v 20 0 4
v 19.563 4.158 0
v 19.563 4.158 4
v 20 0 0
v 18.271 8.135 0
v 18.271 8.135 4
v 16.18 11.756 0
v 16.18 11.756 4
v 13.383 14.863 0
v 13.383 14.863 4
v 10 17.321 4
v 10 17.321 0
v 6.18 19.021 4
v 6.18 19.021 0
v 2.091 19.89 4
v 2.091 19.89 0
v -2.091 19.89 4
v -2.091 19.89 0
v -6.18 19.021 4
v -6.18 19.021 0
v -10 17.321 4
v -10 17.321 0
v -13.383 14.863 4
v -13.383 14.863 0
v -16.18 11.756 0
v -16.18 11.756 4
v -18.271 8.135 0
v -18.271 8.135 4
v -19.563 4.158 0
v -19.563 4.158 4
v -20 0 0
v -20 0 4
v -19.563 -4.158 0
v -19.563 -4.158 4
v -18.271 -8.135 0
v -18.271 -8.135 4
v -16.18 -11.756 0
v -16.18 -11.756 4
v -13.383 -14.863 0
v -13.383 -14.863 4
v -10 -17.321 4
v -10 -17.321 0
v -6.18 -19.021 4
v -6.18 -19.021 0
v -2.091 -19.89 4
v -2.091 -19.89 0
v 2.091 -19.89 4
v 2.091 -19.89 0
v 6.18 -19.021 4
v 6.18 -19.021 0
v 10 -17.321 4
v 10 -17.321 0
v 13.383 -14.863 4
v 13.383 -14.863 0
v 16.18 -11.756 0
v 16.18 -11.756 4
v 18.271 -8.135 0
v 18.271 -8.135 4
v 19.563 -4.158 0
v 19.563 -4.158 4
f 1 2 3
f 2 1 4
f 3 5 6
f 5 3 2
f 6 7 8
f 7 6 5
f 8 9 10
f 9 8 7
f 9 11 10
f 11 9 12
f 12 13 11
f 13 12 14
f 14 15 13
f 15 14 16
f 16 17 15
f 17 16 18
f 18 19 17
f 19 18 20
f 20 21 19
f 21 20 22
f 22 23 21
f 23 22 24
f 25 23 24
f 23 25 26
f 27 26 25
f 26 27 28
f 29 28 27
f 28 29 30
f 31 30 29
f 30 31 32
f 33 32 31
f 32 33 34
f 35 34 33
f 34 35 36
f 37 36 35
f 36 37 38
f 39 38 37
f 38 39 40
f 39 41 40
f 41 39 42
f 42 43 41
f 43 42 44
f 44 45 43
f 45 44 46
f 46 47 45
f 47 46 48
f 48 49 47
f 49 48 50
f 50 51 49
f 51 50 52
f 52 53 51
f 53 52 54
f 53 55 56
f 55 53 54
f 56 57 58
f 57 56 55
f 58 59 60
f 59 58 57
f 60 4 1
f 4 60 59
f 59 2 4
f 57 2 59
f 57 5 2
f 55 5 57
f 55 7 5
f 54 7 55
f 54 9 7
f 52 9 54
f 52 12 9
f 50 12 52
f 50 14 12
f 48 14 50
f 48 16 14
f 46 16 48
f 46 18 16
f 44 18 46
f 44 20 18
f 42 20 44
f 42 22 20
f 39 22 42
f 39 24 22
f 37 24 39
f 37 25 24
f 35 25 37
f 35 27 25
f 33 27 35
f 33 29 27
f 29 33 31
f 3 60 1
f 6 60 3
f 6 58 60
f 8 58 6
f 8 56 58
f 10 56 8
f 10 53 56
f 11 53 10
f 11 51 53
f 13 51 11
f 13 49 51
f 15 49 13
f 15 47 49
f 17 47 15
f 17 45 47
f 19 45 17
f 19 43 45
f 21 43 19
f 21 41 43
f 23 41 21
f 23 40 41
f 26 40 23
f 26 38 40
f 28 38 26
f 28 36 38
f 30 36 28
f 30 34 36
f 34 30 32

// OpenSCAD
// Hollow Multicolored Christmas Tree Test

Tree = false;
TreeBase = true;
Ball1 = false;
Ball2 = false;


if(Tree == true){
	Tree();	
}

if(TreeBase == true){
	TreeBase();
}

if(Ball1 == true){
	Ball1();
}
if(Ball2 == true){
	Ball2();
}

module Tree(){
	translate([0,0,(4)])
	difference(){
		cylinder(30,20,5);
		cylinder(25,17,2);
	}
}

module TreeBase(){
		cylinder(4,20,20);	
}

module Ball1(){
	translate([0,0,(5+5)])
	sphere(r = 5);
	translate([0,60,0])
	cube( 5); 
} 

module Ball2(){
	translate([0,0,(0)])
	sphere(r = 20);

} 
